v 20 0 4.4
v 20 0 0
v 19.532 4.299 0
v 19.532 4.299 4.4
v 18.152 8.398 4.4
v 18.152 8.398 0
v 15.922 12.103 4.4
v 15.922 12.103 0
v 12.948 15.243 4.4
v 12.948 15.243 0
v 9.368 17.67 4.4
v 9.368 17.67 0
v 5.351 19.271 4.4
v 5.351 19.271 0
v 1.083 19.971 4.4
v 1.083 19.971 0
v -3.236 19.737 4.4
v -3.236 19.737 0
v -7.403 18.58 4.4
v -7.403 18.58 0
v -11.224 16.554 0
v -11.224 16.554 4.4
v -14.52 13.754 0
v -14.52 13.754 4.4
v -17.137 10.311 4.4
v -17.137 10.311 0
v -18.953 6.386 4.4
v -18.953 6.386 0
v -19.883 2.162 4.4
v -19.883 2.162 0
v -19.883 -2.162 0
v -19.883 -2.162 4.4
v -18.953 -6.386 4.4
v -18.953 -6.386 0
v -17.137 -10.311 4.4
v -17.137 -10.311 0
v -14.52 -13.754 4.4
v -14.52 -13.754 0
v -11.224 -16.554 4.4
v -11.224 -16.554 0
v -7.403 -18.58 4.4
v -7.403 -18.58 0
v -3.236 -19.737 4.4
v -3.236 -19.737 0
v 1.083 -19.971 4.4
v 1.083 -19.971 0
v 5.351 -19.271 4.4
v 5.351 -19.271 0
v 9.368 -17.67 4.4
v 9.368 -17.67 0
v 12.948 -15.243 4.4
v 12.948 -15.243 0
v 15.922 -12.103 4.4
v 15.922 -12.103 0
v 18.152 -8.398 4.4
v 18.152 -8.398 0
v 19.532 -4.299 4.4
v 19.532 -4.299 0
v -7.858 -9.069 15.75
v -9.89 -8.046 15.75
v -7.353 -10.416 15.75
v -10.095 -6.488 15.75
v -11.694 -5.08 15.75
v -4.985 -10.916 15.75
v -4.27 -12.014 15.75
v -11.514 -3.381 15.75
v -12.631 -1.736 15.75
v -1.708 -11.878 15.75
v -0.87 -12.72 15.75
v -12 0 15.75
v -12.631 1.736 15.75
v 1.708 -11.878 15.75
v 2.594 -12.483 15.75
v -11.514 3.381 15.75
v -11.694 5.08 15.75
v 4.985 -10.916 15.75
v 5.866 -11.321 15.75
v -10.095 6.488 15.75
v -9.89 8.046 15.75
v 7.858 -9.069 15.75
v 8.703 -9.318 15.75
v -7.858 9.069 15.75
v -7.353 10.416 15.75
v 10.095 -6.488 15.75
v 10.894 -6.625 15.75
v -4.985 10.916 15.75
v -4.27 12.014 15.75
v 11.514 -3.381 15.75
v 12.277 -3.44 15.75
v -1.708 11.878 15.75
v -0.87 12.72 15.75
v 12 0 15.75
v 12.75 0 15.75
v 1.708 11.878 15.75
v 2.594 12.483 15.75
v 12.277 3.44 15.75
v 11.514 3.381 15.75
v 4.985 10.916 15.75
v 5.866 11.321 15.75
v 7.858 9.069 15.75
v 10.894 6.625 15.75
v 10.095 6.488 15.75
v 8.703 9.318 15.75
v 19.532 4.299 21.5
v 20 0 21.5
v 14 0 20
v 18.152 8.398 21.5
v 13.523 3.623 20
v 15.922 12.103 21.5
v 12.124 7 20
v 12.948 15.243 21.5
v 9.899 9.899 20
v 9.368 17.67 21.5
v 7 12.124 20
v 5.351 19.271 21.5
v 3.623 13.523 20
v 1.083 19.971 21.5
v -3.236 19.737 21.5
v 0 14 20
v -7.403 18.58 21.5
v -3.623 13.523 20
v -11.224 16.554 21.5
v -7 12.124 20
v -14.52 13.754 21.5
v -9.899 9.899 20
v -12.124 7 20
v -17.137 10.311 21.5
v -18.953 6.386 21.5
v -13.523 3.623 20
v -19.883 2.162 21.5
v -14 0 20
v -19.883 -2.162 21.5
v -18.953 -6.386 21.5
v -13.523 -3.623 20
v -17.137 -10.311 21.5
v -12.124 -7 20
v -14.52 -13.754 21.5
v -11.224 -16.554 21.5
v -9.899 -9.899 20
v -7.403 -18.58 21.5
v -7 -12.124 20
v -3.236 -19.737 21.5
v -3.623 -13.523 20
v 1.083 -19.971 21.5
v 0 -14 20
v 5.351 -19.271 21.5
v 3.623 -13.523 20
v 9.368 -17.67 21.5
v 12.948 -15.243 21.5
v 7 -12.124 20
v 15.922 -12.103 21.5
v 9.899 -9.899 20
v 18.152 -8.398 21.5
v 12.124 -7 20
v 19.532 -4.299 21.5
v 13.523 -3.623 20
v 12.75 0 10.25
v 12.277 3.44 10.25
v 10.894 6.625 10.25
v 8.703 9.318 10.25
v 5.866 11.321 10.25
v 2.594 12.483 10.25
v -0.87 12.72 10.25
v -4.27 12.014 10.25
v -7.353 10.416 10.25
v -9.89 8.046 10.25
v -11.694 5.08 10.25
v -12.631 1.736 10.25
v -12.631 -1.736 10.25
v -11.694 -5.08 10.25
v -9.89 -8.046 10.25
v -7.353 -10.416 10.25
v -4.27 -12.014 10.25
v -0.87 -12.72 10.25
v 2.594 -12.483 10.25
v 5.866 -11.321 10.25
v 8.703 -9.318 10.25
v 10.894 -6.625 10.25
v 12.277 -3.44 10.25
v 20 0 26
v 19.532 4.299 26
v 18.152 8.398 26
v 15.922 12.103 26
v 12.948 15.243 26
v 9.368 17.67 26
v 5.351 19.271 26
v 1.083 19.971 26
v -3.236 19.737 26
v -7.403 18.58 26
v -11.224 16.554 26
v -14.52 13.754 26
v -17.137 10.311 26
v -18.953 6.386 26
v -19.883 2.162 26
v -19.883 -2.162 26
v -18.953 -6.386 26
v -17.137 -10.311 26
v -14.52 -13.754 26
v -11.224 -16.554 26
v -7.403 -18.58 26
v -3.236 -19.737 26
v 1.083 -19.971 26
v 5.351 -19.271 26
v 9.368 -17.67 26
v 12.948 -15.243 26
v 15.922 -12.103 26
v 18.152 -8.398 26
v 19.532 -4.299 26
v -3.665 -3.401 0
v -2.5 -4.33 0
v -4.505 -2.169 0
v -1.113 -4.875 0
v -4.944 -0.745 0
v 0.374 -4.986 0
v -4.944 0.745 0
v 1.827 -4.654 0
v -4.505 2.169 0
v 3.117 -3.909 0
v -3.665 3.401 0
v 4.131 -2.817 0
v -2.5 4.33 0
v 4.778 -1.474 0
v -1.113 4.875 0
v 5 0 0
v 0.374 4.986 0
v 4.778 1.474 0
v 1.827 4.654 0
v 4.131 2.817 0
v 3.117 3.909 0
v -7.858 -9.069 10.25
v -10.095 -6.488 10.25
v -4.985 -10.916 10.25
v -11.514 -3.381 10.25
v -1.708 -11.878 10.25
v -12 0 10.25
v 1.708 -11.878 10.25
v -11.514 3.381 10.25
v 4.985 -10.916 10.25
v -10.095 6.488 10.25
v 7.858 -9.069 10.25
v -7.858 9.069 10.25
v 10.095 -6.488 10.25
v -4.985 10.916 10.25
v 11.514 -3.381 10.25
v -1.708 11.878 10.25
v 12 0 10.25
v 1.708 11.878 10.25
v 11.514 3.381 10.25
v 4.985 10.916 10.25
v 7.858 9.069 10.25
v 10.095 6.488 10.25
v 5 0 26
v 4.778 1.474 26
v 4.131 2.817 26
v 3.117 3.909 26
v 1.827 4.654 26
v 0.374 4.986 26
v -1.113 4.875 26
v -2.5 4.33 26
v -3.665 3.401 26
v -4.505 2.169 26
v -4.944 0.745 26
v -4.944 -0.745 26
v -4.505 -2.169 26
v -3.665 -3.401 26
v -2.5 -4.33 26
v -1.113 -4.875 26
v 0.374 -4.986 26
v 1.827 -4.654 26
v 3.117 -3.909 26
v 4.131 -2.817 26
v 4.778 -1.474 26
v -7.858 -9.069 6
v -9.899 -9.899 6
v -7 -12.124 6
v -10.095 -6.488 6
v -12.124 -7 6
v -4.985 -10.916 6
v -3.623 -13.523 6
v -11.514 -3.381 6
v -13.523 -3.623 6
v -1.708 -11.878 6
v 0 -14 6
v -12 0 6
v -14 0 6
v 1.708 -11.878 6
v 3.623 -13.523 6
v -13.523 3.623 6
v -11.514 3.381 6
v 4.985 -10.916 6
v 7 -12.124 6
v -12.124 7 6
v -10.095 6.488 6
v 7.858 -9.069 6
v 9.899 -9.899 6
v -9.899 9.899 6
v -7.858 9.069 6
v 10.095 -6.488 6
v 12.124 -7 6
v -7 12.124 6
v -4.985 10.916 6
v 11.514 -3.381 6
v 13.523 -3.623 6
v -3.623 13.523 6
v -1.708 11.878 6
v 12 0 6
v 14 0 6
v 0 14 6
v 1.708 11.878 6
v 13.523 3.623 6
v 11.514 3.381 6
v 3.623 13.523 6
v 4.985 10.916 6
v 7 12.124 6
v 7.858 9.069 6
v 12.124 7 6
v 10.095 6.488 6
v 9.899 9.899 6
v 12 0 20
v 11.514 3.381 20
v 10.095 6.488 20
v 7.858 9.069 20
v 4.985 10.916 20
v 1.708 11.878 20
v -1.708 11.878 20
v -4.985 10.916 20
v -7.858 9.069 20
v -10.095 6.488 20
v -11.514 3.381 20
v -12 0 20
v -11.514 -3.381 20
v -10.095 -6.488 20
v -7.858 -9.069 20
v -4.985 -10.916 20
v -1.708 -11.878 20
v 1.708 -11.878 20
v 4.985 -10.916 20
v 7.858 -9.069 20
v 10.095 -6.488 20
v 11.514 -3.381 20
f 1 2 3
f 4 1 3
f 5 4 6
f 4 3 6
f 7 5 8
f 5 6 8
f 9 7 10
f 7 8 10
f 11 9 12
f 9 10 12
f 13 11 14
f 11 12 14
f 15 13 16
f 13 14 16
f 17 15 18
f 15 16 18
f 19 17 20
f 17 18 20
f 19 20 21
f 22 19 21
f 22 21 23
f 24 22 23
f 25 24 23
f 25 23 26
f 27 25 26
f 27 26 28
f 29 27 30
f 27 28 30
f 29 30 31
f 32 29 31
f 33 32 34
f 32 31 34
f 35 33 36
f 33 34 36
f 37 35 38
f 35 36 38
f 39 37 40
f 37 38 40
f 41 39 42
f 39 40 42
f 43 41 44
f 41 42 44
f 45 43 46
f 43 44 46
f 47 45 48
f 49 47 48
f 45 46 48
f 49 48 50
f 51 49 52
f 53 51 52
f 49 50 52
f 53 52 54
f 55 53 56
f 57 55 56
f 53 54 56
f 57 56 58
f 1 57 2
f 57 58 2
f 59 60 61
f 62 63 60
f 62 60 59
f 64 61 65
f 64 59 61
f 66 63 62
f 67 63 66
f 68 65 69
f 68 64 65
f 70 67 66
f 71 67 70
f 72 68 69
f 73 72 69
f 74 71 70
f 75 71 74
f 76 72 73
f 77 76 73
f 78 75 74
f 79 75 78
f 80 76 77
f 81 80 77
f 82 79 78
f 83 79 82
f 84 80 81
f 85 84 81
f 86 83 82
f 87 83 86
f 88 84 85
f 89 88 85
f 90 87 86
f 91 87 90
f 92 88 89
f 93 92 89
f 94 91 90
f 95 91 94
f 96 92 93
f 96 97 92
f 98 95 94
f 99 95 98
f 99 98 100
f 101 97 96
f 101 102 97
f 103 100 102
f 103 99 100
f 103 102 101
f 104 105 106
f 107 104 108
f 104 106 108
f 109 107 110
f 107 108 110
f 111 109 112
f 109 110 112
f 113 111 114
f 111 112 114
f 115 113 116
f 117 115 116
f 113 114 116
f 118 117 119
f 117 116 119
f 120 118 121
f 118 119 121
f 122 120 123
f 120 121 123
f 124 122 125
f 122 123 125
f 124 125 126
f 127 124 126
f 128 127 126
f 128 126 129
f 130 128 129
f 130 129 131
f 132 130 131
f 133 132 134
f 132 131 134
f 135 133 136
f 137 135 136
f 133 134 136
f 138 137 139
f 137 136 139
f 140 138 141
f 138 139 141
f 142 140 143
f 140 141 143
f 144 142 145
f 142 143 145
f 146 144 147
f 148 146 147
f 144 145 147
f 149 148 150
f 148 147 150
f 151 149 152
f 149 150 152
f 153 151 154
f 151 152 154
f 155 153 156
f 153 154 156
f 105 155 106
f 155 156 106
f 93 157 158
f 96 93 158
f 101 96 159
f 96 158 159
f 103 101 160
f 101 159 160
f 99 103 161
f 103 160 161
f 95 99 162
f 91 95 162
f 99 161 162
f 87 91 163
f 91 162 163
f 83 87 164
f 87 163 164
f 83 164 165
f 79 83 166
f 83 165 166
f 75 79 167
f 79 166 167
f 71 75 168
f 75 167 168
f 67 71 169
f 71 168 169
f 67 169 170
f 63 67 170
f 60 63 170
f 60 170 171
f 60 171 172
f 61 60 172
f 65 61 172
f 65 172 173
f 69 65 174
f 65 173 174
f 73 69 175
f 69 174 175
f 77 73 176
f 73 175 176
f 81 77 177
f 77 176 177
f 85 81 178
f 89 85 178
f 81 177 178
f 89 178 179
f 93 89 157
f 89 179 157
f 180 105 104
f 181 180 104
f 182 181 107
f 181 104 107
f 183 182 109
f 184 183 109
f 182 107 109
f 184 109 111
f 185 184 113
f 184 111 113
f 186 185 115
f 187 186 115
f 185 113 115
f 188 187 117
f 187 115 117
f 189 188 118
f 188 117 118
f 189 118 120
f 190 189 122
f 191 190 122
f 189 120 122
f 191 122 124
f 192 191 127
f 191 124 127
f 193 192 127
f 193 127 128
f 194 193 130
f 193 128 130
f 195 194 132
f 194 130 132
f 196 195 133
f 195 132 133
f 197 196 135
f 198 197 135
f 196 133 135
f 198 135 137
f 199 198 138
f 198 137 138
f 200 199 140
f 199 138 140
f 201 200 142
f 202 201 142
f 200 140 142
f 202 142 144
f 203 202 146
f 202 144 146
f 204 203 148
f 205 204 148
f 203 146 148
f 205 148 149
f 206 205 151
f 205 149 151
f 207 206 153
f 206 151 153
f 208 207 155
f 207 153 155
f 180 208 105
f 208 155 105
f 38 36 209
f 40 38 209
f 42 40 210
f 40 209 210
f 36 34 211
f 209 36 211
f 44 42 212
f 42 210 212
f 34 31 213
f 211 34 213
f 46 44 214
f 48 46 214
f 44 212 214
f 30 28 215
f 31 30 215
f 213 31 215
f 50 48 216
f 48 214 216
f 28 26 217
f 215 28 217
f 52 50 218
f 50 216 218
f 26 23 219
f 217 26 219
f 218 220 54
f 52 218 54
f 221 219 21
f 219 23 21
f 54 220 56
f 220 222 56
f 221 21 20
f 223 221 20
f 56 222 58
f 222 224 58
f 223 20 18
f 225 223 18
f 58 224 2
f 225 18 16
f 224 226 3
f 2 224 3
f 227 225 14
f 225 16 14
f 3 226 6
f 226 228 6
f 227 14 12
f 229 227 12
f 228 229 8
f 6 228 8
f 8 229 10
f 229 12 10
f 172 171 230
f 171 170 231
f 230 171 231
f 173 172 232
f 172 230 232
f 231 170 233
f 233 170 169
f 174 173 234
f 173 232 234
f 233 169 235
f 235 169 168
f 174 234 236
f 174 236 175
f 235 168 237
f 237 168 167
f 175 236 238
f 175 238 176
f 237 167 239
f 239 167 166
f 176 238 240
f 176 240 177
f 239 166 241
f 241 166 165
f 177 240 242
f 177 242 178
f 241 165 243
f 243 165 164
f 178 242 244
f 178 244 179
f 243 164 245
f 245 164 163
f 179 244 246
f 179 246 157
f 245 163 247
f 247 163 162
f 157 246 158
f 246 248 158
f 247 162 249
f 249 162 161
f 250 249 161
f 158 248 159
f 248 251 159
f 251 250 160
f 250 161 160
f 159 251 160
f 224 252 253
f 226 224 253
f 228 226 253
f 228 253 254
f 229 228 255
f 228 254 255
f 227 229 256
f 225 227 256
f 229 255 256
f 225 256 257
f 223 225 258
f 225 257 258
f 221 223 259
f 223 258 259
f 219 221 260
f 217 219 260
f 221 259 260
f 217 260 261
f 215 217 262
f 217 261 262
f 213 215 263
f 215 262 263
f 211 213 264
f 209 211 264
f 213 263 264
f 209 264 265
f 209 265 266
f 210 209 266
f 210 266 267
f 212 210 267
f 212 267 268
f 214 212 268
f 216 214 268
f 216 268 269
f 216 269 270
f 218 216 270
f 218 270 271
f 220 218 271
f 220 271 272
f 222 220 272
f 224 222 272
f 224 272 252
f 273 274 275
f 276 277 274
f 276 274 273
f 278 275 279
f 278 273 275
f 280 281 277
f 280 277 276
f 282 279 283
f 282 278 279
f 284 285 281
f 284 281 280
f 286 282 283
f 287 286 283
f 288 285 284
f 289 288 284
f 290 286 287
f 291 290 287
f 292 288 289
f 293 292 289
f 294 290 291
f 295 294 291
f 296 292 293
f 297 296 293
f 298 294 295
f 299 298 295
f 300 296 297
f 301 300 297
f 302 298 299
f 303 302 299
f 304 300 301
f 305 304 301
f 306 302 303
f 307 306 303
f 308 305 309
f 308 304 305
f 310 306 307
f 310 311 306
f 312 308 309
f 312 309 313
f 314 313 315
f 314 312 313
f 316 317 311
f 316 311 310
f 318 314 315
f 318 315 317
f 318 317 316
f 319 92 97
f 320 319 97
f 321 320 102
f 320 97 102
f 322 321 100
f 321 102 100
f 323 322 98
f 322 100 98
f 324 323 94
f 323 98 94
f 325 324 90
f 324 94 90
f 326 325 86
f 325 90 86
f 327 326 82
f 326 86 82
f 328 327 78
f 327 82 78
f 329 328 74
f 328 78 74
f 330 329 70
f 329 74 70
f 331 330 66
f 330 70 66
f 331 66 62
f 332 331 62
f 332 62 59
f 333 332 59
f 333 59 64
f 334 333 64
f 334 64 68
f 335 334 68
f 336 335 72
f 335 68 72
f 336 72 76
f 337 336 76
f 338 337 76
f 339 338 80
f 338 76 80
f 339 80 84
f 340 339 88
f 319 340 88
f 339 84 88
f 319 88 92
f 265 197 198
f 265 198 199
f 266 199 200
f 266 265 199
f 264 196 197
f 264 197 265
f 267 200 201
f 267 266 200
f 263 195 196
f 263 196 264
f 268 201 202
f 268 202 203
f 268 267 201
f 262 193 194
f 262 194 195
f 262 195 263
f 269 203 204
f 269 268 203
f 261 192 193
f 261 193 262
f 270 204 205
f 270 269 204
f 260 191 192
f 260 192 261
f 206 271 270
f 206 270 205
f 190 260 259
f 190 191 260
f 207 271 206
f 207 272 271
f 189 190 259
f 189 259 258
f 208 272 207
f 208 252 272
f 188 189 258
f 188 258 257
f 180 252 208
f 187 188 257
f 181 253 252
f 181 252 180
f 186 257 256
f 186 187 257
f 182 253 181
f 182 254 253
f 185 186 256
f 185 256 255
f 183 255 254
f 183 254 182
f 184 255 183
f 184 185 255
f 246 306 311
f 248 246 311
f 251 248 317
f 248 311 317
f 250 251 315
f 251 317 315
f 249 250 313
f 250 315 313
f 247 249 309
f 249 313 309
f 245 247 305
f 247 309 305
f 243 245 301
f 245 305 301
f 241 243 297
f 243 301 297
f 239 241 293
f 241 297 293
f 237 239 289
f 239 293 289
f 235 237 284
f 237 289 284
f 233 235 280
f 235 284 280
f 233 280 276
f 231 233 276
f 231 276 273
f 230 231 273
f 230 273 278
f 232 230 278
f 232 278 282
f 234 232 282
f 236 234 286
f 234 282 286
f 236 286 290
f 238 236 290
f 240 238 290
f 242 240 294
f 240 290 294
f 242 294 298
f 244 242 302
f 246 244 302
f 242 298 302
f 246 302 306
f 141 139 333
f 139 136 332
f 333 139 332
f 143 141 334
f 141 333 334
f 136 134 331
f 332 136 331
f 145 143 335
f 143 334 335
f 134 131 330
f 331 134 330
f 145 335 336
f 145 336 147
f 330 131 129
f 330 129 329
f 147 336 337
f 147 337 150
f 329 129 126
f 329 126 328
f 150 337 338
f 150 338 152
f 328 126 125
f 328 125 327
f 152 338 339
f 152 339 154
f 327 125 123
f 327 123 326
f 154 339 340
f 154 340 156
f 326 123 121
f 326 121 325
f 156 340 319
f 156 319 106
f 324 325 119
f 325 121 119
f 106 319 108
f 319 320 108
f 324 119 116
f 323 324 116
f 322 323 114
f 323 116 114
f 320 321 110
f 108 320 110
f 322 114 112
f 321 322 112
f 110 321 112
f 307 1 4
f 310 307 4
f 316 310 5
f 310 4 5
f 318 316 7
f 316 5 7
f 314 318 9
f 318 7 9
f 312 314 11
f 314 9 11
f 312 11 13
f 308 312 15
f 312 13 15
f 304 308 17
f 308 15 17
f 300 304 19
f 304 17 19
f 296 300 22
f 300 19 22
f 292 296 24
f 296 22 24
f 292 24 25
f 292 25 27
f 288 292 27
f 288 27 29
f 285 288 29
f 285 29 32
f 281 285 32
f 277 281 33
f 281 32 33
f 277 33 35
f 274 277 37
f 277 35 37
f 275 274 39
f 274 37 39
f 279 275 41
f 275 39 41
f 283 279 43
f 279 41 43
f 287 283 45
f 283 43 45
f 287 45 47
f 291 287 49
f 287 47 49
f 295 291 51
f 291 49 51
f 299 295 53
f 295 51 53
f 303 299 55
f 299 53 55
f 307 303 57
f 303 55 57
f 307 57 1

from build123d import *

# Parameters (mm, degrees)
F0_R      = 20
F1_DEPTH  = 6
F2_R      = 12
F3_DEPTH  = 4.25
F4_R      = 12.75
F5_DEPTH  = 5.5
F6_R      = 12
F7_DEPTH  = 4.25
F8_R      = 20
F9_DEPTH  = 6
F10_R     = 5
F11_DEPTH = 26.001
F12_SIZE2 = 1.6
F12_SIZE  = 6
F13_SIZE2 = 6
F13_SIZE  = 1.5


with BuildPart() as f1:
    # F0 (on Top) → F1 (new body)
    with BuildSketch(Plane.XY):
        Circle(F0_R)
    extrude(amount=F1_DEPTH)

    # F2 (on face) → F3 (join)
    with BuildSketch(Plane.XY.offset(6)):
        Circle(F2_R)
    extrude(amount=F3_DEPTH)

    # F4 (on face) → F5 (join)
    with BuildSketch(Plane.XY.offset(10.25)):
        Circle(F4_R)
    extrude(amount=F5_DEPTH)

    # F6 (on face) → F7 (join)
    with BuildSketch(Plane.XY.offset(15.75)):
        Circle(F6_R)
    extrude(amount=F7_DEPTH)

    # F8 (on face) → F9 (join)
    with BuildSketch(Plane.XY.offset(20)):
        Circle(F8_R)
    extrude(amount=F9_DEPTH)

    # F10 (on face) → F11 (cut, through all)
    with BuildSketch(Plane.XY.offset(26)):
        Circle(F10_R)
    extrude(amount=-F11_DEPTH, mode=Mode.SUBTRACT)

    # F12
    f12_edges = [f1.edges().sort_by_distance(p)[0] for p in [
        (-20, 0, 6),
    ]]
    f12_side = f1.faces().sort_by_distance((-19.434315, 0, 6))[0]
    chamfer(f12_edges, length=F12_SIZE, length2=F12_SIZE2, reference=f12_side)

    # F13
    f13_edges = [f1.edges().sort_by_distance(p)[0] for p in [
        (-20, 0, 20),
    ]]
    f13_side = f1.faces().sort_by_distance((-20, 0, 23))[0]
    chamfer(f13_edges, length=F13_SIZE, length2=F13_SIZE2, reference=f13_side)


solid = f1.part
